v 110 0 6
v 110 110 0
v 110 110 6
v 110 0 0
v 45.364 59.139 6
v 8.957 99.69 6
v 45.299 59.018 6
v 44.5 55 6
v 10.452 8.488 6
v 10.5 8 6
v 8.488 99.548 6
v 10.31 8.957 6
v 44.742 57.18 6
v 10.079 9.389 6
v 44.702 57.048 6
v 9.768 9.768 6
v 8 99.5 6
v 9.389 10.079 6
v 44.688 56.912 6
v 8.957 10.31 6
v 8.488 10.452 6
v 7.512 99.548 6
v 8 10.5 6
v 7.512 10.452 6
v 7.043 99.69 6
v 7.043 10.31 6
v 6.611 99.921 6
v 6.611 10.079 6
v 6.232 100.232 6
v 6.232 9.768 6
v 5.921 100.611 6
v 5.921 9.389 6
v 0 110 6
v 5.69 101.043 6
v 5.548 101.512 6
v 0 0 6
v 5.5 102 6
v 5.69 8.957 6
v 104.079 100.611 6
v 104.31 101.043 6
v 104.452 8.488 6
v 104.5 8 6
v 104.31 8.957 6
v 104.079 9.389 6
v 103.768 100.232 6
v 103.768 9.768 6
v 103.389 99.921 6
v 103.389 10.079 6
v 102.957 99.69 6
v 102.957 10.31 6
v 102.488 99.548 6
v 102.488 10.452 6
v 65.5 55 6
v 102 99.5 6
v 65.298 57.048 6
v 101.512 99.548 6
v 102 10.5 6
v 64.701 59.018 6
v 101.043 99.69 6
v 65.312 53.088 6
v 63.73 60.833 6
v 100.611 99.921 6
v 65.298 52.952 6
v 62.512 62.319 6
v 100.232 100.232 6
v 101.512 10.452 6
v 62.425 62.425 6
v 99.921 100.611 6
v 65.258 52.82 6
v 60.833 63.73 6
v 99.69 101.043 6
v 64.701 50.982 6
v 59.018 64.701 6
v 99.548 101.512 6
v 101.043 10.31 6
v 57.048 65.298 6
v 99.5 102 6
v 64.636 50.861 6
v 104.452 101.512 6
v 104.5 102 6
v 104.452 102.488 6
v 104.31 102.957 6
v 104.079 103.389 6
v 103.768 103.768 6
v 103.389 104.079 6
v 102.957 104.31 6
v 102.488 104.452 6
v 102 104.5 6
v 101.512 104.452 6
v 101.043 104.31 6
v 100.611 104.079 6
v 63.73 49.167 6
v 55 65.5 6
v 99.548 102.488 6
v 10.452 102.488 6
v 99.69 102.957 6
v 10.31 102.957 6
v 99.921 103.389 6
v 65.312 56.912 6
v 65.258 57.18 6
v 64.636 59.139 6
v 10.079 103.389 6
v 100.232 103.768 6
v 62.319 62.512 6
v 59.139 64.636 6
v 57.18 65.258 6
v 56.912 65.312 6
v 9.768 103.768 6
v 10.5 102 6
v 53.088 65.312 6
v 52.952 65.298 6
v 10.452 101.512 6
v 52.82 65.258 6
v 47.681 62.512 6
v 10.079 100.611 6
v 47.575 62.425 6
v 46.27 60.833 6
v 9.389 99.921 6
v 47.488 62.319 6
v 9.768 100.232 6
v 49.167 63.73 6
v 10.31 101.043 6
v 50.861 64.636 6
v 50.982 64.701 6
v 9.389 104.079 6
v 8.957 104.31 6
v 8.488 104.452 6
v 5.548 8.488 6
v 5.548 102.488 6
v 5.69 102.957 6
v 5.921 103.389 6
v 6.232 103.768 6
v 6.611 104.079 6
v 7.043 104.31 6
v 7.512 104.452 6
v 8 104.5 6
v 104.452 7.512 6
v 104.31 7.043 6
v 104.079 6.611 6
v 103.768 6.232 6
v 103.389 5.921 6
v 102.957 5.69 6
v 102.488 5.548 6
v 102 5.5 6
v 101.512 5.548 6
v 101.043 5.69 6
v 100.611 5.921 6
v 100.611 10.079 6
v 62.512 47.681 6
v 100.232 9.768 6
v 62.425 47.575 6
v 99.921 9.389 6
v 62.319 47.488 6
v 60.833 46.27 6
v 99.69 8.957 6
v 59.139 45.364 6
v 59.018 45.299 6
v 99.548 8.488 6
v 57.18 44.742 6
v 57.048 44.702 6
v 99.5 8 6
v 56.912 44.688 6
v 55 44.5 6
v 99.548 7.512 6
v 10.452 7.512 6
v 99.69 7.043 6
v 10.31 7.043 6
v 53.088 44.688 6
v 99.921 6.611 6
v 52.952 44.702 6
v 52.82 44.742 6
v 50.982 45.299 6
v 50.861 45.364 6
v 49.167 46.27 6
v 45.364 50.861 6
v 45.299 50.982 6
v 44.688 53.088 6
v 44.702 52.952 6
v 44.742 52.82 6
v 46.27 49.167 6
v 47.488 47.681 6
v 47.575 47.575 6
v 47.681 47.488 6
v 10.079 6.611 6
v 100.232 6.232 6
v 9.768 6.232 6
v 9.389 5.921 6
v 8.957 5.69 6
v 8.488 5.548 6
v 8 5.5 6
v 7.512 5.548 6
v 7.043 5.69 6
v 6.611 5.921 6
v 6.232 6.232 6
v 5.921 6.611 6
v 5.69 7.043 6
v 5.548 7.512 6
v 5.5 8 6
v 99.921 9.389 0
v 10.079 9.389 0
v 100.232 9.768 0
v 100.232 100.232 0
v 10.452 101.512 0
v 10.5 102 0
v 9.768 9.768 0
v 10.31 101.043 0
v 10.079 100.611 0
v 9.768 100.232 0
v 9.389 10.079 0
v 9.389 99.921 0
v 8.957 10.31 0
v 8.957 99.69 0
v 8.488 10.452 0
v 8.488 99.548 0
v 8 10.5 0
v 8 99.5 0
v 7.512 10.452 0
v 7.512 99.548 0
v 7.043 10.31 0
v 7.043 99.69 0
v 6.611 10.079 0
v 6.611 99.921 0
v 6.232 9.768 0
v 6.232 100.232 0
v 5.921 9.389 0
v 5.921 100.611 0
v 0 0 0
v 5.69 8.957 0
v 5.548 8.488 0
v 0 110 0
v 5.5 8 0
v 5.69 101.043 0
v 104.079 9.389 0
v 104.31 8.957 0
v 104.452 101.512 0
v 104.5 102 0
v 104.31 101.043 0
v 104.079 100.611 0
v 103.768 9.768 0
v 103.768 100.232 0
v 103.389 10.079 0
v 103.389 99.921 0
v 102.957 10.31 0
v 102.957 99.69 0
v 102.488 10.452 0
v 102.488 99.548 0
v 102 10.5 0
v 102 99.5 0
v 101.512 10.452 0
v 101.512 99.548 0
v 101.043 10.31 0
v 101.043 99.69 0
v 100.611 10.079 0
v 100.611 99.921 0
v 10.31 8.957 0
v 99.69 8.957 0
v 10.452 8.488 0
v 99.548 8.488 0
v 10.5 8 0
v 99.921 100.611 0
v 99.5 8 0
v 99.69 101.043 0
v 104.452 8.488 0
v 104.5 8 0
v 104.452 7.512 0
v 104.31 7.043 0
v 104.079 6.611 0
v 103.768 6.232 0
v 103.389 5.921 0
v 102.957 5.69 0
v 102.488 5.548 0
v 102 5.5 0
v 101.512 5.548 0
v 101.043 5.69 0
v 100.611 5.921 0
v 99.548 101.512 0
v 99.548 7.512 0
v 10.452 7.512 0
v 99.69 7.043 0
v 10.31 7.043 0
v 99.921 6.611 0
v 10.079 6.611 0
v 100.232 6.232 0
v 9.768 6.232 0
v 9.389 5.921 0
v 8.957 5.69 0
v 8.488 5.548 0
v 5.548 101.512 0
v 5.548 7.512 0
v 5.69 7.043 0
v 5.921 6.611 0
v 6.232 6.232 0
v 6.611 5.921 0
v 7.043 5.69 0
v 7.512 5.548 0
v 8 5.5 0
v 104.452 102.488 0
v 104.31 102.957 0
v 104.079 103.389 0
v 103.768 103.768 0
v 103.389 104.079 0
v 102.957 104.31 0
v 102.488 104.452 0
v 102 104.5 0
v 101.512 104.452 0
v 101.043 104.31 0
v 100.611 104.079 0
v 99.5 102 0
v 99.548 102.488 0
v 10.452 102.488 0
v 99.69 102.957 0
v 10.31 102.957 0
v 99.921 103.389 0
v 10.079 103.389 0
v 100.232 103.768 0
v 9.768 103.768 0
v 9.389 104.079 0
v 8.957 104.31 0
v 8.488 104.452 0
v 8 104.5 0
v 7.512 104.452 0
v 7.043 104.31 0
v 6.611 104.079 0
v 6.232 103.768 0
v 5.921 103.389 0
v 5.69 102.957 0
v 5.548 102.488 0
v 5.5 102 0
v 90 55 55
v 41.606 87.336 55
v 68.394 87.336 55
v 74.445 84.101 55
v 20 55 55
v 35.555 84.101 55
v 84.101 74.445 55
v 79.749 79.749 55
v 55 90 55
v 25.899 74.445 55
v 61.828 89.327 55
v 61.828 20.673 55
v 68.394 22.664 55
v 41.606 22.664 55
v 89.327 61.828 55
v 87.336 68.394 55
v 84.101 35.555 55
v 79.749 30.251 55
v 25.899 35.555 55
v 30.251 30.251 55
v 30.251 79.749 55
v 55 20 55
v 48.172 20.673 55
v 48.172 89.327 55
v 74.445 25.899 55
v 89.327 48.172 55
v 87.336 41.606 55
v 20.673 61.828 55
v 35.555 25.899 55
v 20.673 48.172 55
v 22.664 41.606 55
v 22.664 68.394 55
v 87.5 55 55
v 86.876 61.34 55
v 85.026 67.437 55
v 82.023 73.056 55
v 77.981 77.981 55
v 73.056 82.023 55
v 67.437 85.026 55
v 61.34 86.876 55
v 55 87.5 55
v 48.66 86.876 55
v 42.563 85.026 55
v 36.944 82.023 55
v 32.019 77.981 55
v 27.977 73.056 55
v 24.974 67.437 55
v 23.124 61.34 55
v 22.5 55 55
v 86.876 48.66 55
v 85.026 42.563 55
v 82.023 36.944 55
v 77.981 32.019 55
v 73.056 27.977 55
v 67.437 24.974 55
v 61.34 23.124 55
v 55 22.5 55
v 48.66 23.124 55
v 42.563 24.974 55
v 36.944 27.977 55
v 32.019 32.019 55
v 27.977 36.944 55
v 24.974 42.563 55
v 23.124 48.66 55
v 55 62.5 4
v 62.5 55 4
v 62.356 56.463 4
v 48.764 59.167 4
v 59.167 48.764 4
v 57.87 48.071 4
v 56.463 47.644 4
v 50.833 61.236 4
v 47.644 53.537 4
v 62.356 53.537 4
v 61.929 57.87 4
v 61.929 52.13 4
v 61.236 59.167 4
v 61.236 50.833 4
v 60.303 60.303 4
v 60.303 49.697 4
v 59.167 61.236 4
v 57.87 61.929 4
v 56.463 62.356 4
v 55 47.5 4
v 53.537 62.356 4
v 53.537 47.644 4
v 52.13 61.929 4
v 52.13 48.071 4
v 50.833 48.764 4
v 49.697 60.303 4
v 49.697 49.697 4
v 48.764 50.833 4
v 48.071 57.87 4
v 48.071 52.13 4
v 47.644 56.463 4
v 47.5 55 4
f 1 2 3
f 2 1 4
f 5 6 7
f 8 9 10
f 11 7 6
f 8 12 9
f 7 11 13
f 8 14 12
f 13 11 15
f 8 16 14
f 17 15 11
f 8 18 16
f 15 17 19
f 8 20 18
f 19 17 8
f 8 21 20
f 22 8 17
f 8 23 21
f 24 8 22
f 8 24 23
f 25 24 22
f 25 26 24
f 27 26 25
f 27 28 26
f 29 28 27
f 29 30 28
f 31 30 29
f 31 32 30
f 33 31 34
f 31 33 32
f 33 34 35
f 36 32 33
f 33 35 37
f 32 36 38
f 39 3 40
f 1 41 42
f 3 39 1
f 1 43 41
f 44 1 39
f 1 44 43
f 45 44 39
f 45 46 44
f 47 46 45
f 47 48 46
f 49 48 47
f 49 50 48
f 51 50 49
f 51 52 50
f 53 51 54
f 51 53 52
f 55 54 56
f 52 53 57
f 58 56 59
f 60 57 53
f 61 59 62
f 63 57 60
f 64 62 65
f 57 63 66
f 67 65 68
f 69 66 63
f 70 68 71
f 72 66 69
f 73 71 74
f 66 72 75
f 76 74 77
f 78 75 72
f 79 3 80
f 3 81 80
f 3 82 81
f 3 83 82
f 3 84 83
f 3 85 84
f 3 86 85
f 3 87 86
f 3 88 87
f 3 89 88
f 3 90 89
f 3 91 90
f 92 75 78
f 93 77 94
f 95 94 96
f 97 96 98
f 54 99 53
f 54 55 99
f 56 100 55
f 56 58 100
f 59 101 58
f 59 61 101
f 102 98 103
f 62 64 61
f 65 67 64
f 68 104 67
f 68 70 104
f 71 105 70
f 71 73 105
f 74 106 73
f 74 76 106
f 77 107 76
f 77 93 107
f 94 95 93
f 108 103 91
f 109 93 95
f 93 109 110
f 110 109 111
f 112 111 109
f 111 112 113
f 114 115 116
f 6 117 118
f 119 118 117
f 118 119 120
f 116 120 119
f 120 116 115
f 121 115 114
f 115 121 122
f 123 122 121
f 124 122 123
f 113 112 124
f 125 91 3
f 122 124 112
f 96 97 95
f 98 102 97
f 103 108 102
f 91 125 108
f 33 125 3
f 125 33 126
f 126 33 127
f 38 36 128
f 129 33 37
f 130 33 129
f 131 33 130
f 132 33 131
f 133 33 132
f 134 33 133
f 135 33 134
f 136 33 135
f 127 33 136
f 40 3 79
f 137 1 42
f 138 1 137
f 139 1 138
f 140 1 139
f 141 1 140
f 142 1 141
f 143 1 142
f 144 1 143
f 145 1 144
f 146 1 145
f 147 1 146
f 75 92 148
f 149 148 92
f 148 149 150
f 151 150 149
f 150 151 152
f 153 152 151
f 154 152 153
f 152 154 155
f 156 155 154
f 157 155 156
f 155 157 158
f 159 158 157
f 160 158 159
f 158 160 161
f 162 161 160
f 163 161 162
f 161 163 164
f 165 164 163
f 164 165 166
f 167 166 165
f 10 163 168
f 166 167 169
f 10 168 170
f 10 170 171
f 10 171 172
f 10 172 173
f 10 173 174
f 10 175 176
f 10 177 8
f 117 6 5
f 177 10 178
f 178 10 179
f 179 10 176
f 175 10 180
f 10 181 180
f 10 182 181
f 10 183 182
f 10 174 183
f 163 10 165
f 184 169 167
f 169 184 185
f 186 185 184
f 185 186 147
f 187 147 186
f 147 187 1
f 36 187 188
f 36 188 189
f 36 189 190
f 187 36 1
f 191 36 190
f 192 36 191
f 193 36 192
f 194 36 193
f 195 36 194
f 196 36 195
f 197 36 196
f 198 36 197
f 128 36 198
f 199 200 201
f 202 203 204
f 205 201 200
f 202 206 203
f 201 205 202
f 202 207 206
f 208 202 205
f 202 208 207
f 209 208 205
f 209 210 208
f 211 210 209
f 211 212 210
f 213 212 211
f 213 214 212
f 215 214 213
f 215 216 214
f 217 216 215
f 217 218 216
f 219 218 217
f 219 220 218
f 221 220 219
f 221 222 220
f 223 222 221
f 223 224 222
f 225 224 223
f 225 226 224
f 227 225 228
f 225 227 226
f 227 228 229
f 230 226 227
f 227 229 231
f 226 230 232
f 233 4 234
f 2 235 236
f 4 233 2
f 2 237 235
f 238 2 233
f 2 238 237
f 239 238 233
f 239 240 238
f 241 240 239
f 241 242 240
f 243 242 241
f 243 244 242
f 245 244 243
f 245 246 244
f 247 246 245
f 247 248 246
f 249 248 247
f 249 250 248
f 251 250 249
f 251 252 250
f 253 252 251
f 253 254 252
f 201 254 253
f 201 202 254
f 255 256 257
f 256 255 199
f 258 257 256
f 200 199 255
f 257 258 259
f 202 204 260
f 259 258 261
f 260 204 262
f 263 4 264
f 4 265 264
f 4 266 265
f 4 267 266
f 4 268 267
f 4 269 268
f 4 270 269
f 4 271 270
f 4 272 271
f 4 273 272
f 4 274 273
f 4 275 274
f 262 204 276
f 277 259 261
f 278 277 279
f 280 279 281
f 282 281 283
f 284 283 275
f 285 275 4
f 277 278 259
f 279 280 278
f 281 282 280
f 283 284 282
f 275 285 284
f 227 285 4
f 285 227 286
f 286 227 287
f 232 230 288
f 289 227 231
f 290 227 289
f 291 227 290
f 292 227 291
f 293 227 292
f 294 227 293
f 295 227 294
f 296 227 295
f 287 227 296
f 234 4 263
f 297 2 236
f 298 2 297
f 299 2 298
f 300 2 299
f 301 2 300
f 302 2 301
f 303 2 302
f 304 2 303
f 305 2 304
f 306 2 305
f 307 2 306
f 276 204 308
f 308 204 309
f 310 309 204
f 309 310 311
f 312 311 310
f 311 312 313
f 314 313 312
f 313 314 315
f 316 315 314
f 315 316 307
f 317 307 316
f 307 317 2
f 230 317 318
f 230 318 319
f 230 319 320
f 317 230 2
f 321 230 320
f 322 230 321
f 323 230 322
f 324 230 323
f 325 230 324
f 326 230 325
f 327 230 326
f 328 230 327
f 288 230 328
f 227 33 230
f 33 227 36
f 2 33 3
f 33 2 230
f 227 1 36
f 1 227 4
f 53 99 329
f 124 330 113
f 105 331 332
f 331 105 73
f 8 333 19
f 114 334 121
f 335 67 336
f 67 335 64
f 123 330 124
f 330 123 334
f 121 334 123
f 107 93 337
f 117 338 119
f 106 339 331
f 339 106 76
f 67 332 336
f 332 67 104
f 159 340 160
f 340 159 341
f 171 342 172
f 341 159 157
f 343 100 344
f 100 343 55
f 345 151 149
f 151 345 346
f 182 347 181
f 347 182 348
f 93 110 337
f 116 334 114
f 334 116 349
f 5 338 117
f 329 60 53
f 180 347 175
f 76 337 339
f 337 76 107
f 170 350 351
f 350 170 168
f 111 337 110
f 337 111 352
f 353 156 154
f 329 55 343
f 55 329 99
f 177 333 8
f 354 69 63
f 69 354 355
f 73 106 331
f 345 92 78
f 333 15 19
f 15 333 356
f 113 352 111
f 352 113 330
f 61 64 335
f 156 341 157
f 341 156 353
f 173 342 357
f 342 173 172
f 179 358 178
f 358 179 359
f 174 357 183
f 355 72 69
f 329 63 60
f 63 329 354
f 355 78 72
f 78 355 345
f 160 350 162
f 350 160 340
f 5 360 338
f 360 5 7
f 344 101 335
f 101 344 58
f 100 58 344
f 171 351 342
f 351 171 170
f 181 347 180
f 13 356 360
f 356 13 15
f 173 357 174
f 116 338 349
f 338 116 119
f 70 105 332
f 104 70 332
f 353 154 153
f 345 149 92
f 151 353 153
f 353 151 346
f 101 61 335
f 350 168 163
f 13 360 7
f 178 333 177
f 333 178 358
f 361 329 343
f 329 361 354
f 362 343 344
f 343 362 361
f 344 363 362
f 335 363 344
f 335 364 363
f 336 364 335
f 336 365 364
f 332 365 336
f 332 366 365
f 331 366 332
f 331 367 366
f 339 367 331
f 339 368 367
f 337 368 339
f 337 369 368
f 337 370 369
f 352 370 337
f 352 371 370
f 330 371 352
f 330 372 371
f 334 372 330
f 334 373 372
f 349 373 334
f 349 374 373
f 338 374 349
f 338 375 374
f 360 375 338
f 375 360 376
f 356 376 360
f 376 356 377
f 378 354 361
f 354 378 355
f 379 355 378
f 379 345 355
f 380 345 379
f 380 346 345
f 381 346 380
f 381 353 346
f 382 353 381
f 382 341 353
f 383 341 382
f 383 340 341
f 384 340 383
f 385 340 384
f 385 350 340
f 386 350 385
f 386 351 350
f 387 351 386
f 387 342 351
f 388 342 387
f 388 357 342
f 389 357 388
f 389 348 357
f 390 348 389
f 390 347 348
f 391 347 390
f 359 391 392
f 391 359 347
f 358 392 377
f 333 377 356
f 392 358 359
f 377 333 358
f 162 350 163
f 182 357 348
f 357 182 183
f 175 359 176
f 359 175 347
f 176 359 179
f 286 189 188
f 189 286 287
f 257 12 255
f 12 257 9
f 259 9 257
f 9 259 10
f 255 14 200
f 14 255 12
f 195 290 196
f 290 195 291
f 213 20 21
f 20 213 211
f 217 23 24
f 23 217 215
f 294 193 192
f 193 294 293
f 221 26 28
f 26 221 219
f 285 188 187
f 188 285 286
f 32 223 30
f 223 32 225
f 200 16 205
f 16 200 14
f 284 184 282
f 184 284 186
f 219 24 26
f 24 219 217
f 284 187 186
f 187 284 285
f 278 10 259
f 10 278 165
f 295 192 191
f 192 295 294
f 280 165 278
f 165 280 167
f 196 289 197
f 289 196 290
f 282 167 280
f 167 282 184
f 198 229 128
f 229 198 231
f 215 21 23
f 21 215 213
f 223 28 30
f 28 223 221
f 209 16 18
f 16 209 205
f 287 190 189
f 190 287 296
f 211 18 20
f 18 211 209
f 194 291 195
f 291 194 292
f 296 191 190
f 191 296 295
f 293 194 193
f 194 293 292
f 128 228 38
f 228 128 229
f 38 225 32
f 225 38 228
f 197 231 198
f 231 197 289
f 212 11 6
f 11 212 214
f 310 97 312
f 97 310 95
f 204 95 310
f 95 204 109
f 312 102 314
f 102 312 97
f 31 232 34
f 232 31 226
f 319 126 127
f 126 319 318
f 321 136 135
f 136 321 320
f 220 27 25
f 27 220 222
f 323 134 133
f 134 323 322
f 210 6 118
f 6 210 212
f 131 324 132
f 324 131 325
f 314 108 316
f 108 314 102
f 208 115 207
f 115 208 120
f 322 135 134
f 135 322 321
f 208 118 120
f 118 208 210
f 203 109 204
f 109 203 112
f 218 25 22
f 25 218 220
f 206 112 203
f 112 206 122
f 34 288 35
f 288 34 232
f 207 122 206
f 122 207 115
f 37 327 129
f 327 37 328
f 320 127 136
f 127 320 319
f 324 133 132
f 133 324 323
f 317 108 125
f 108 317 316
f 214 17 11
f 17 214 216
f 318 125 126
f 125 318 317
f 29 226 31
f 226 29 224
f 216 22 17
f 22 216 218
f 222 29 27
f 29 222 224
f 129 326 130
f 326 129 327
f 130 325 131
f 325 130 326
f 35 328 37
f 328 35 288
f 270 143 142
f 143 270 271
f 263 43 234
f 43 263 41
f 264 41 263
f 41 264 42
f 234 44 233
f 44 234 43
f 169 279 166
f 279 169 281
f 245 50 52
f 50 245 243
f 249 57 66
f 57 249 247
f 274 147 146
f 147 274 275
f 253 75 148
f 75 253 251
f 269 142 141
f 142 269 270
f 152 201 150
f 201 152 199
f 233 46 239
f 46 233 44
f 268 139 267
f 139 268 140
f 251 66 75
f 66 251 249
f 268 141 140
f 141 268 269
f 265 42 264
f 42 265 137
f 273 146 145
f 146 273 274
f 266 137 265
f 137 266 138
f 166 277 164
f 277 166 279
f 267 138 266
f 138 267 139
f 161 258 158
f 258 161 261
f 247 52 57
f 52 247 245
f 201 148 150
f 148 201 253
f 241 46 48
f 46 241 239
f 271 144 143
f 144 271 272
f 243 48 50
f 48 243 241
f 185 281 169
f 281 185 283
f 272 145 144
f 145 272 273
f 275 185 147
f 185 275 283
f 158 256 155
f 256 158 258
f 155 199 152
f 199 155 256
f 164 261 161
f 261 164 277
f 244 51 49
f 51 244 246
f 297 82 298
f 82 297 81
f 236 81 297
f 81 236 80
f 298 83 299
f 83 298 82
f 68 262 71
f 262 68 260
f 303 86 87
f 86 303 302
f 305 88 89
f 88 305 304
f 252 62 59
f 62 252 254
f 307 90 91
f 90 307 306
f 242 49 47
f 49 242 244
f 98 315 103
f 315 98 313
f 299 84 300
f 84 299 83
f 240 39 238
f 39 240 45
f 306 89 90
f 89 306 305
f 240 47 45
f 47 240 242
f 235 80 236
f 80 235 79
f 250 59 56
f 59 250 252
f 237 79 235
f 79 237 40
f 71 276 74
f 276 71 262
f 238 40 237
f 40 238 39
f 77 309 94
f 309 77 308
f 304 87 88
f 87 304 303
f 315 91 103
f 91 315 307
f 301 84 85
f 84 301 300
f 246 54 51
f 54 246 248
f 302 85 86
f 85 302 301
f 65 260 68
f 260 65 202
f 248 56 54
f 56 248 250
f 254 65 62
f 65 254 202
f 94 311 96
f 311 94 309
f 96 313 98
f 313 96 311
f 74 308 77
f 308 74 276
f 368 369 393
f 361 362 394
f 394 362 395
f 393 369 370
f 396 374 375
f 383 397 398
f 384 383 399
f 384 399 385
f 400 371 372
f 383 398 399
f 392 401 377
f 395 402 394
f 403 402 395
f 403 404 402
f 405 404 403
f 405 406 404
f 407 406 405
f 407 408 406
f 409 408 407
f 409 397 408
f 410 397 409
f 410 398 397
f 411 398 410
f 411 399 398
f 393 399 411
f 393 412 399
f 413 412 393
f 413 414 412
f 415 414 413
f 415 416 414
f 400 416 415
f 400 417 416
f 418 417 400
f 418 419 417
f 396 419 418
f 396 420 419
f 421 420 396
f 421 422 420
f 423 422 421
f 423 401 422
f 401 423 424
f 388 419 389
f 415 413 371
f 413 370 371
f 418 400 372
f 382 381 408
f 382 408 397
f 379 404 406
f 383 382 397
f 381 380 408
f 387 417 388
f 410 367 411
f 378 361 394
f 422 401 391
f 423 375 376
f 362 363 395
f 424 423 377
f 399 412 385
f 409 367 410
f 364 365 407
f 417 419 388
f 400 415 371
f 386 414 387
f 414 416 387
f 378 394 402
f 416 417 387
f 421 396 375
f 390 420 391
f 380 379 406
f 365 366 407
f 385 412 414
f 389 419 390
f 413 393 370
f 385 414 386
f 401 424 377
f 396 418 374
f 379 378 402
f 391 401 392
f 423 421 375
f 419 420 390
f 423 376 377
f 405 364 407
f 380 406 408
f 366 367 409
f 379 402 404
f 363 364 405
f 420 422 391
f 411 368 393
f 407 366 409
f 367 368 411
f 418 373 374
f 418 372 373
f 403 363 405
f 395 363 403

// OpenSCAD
$fn = 32;

// ----------------------------------------------------------------------
// Hopper: flanged with square flange
// ----------------------------------------------------------------------

// --- parameters (mm) ---
fl = 110;                 // flange side, X and Y
fl_t = 6;                 // flange thickness
cone_h = 50;              // cone height above the flange
top_d = 70;               // cone mouth diameter
bot_d = 20;               // cone spout diameter
wall = 2.5;               // cone wall thickness
hole_r = 2.5;             // flange hole radius
hole_in = 8;              // hole inset from the corners
fit_tol = 0.05;           // tolerance for press fits, mm
free_tol = 0.3;           // tolerance for clearance fits, mm

bore_d = bot_d - 2 * wall;  // spout bore diameter
total_h = fl_t + cone_h - 1;  // overall height

difference() {
  union() {
    cube([fl, fl, fl_t]);
    translate([fl / 2, fl / 2, fl_t - 1])
      cylinder(h = cone_h, d1 = bot_d, d2 = top_d);
  }
  translate([fl / 2, fl / 2, fl_t - 2])
    cylinder(h = cone_h + 1, d1 = bore_d, d2 = top_d - 2 * wall);
  for (sx = [0, 1], sy = [0, 1])
    translate([sx ? fl - hole_in : hole_in,
               sy ? fl - hole_in : hole_in, -1])
      cylinder(r = hole_r, h = fl_t + 2);
}
